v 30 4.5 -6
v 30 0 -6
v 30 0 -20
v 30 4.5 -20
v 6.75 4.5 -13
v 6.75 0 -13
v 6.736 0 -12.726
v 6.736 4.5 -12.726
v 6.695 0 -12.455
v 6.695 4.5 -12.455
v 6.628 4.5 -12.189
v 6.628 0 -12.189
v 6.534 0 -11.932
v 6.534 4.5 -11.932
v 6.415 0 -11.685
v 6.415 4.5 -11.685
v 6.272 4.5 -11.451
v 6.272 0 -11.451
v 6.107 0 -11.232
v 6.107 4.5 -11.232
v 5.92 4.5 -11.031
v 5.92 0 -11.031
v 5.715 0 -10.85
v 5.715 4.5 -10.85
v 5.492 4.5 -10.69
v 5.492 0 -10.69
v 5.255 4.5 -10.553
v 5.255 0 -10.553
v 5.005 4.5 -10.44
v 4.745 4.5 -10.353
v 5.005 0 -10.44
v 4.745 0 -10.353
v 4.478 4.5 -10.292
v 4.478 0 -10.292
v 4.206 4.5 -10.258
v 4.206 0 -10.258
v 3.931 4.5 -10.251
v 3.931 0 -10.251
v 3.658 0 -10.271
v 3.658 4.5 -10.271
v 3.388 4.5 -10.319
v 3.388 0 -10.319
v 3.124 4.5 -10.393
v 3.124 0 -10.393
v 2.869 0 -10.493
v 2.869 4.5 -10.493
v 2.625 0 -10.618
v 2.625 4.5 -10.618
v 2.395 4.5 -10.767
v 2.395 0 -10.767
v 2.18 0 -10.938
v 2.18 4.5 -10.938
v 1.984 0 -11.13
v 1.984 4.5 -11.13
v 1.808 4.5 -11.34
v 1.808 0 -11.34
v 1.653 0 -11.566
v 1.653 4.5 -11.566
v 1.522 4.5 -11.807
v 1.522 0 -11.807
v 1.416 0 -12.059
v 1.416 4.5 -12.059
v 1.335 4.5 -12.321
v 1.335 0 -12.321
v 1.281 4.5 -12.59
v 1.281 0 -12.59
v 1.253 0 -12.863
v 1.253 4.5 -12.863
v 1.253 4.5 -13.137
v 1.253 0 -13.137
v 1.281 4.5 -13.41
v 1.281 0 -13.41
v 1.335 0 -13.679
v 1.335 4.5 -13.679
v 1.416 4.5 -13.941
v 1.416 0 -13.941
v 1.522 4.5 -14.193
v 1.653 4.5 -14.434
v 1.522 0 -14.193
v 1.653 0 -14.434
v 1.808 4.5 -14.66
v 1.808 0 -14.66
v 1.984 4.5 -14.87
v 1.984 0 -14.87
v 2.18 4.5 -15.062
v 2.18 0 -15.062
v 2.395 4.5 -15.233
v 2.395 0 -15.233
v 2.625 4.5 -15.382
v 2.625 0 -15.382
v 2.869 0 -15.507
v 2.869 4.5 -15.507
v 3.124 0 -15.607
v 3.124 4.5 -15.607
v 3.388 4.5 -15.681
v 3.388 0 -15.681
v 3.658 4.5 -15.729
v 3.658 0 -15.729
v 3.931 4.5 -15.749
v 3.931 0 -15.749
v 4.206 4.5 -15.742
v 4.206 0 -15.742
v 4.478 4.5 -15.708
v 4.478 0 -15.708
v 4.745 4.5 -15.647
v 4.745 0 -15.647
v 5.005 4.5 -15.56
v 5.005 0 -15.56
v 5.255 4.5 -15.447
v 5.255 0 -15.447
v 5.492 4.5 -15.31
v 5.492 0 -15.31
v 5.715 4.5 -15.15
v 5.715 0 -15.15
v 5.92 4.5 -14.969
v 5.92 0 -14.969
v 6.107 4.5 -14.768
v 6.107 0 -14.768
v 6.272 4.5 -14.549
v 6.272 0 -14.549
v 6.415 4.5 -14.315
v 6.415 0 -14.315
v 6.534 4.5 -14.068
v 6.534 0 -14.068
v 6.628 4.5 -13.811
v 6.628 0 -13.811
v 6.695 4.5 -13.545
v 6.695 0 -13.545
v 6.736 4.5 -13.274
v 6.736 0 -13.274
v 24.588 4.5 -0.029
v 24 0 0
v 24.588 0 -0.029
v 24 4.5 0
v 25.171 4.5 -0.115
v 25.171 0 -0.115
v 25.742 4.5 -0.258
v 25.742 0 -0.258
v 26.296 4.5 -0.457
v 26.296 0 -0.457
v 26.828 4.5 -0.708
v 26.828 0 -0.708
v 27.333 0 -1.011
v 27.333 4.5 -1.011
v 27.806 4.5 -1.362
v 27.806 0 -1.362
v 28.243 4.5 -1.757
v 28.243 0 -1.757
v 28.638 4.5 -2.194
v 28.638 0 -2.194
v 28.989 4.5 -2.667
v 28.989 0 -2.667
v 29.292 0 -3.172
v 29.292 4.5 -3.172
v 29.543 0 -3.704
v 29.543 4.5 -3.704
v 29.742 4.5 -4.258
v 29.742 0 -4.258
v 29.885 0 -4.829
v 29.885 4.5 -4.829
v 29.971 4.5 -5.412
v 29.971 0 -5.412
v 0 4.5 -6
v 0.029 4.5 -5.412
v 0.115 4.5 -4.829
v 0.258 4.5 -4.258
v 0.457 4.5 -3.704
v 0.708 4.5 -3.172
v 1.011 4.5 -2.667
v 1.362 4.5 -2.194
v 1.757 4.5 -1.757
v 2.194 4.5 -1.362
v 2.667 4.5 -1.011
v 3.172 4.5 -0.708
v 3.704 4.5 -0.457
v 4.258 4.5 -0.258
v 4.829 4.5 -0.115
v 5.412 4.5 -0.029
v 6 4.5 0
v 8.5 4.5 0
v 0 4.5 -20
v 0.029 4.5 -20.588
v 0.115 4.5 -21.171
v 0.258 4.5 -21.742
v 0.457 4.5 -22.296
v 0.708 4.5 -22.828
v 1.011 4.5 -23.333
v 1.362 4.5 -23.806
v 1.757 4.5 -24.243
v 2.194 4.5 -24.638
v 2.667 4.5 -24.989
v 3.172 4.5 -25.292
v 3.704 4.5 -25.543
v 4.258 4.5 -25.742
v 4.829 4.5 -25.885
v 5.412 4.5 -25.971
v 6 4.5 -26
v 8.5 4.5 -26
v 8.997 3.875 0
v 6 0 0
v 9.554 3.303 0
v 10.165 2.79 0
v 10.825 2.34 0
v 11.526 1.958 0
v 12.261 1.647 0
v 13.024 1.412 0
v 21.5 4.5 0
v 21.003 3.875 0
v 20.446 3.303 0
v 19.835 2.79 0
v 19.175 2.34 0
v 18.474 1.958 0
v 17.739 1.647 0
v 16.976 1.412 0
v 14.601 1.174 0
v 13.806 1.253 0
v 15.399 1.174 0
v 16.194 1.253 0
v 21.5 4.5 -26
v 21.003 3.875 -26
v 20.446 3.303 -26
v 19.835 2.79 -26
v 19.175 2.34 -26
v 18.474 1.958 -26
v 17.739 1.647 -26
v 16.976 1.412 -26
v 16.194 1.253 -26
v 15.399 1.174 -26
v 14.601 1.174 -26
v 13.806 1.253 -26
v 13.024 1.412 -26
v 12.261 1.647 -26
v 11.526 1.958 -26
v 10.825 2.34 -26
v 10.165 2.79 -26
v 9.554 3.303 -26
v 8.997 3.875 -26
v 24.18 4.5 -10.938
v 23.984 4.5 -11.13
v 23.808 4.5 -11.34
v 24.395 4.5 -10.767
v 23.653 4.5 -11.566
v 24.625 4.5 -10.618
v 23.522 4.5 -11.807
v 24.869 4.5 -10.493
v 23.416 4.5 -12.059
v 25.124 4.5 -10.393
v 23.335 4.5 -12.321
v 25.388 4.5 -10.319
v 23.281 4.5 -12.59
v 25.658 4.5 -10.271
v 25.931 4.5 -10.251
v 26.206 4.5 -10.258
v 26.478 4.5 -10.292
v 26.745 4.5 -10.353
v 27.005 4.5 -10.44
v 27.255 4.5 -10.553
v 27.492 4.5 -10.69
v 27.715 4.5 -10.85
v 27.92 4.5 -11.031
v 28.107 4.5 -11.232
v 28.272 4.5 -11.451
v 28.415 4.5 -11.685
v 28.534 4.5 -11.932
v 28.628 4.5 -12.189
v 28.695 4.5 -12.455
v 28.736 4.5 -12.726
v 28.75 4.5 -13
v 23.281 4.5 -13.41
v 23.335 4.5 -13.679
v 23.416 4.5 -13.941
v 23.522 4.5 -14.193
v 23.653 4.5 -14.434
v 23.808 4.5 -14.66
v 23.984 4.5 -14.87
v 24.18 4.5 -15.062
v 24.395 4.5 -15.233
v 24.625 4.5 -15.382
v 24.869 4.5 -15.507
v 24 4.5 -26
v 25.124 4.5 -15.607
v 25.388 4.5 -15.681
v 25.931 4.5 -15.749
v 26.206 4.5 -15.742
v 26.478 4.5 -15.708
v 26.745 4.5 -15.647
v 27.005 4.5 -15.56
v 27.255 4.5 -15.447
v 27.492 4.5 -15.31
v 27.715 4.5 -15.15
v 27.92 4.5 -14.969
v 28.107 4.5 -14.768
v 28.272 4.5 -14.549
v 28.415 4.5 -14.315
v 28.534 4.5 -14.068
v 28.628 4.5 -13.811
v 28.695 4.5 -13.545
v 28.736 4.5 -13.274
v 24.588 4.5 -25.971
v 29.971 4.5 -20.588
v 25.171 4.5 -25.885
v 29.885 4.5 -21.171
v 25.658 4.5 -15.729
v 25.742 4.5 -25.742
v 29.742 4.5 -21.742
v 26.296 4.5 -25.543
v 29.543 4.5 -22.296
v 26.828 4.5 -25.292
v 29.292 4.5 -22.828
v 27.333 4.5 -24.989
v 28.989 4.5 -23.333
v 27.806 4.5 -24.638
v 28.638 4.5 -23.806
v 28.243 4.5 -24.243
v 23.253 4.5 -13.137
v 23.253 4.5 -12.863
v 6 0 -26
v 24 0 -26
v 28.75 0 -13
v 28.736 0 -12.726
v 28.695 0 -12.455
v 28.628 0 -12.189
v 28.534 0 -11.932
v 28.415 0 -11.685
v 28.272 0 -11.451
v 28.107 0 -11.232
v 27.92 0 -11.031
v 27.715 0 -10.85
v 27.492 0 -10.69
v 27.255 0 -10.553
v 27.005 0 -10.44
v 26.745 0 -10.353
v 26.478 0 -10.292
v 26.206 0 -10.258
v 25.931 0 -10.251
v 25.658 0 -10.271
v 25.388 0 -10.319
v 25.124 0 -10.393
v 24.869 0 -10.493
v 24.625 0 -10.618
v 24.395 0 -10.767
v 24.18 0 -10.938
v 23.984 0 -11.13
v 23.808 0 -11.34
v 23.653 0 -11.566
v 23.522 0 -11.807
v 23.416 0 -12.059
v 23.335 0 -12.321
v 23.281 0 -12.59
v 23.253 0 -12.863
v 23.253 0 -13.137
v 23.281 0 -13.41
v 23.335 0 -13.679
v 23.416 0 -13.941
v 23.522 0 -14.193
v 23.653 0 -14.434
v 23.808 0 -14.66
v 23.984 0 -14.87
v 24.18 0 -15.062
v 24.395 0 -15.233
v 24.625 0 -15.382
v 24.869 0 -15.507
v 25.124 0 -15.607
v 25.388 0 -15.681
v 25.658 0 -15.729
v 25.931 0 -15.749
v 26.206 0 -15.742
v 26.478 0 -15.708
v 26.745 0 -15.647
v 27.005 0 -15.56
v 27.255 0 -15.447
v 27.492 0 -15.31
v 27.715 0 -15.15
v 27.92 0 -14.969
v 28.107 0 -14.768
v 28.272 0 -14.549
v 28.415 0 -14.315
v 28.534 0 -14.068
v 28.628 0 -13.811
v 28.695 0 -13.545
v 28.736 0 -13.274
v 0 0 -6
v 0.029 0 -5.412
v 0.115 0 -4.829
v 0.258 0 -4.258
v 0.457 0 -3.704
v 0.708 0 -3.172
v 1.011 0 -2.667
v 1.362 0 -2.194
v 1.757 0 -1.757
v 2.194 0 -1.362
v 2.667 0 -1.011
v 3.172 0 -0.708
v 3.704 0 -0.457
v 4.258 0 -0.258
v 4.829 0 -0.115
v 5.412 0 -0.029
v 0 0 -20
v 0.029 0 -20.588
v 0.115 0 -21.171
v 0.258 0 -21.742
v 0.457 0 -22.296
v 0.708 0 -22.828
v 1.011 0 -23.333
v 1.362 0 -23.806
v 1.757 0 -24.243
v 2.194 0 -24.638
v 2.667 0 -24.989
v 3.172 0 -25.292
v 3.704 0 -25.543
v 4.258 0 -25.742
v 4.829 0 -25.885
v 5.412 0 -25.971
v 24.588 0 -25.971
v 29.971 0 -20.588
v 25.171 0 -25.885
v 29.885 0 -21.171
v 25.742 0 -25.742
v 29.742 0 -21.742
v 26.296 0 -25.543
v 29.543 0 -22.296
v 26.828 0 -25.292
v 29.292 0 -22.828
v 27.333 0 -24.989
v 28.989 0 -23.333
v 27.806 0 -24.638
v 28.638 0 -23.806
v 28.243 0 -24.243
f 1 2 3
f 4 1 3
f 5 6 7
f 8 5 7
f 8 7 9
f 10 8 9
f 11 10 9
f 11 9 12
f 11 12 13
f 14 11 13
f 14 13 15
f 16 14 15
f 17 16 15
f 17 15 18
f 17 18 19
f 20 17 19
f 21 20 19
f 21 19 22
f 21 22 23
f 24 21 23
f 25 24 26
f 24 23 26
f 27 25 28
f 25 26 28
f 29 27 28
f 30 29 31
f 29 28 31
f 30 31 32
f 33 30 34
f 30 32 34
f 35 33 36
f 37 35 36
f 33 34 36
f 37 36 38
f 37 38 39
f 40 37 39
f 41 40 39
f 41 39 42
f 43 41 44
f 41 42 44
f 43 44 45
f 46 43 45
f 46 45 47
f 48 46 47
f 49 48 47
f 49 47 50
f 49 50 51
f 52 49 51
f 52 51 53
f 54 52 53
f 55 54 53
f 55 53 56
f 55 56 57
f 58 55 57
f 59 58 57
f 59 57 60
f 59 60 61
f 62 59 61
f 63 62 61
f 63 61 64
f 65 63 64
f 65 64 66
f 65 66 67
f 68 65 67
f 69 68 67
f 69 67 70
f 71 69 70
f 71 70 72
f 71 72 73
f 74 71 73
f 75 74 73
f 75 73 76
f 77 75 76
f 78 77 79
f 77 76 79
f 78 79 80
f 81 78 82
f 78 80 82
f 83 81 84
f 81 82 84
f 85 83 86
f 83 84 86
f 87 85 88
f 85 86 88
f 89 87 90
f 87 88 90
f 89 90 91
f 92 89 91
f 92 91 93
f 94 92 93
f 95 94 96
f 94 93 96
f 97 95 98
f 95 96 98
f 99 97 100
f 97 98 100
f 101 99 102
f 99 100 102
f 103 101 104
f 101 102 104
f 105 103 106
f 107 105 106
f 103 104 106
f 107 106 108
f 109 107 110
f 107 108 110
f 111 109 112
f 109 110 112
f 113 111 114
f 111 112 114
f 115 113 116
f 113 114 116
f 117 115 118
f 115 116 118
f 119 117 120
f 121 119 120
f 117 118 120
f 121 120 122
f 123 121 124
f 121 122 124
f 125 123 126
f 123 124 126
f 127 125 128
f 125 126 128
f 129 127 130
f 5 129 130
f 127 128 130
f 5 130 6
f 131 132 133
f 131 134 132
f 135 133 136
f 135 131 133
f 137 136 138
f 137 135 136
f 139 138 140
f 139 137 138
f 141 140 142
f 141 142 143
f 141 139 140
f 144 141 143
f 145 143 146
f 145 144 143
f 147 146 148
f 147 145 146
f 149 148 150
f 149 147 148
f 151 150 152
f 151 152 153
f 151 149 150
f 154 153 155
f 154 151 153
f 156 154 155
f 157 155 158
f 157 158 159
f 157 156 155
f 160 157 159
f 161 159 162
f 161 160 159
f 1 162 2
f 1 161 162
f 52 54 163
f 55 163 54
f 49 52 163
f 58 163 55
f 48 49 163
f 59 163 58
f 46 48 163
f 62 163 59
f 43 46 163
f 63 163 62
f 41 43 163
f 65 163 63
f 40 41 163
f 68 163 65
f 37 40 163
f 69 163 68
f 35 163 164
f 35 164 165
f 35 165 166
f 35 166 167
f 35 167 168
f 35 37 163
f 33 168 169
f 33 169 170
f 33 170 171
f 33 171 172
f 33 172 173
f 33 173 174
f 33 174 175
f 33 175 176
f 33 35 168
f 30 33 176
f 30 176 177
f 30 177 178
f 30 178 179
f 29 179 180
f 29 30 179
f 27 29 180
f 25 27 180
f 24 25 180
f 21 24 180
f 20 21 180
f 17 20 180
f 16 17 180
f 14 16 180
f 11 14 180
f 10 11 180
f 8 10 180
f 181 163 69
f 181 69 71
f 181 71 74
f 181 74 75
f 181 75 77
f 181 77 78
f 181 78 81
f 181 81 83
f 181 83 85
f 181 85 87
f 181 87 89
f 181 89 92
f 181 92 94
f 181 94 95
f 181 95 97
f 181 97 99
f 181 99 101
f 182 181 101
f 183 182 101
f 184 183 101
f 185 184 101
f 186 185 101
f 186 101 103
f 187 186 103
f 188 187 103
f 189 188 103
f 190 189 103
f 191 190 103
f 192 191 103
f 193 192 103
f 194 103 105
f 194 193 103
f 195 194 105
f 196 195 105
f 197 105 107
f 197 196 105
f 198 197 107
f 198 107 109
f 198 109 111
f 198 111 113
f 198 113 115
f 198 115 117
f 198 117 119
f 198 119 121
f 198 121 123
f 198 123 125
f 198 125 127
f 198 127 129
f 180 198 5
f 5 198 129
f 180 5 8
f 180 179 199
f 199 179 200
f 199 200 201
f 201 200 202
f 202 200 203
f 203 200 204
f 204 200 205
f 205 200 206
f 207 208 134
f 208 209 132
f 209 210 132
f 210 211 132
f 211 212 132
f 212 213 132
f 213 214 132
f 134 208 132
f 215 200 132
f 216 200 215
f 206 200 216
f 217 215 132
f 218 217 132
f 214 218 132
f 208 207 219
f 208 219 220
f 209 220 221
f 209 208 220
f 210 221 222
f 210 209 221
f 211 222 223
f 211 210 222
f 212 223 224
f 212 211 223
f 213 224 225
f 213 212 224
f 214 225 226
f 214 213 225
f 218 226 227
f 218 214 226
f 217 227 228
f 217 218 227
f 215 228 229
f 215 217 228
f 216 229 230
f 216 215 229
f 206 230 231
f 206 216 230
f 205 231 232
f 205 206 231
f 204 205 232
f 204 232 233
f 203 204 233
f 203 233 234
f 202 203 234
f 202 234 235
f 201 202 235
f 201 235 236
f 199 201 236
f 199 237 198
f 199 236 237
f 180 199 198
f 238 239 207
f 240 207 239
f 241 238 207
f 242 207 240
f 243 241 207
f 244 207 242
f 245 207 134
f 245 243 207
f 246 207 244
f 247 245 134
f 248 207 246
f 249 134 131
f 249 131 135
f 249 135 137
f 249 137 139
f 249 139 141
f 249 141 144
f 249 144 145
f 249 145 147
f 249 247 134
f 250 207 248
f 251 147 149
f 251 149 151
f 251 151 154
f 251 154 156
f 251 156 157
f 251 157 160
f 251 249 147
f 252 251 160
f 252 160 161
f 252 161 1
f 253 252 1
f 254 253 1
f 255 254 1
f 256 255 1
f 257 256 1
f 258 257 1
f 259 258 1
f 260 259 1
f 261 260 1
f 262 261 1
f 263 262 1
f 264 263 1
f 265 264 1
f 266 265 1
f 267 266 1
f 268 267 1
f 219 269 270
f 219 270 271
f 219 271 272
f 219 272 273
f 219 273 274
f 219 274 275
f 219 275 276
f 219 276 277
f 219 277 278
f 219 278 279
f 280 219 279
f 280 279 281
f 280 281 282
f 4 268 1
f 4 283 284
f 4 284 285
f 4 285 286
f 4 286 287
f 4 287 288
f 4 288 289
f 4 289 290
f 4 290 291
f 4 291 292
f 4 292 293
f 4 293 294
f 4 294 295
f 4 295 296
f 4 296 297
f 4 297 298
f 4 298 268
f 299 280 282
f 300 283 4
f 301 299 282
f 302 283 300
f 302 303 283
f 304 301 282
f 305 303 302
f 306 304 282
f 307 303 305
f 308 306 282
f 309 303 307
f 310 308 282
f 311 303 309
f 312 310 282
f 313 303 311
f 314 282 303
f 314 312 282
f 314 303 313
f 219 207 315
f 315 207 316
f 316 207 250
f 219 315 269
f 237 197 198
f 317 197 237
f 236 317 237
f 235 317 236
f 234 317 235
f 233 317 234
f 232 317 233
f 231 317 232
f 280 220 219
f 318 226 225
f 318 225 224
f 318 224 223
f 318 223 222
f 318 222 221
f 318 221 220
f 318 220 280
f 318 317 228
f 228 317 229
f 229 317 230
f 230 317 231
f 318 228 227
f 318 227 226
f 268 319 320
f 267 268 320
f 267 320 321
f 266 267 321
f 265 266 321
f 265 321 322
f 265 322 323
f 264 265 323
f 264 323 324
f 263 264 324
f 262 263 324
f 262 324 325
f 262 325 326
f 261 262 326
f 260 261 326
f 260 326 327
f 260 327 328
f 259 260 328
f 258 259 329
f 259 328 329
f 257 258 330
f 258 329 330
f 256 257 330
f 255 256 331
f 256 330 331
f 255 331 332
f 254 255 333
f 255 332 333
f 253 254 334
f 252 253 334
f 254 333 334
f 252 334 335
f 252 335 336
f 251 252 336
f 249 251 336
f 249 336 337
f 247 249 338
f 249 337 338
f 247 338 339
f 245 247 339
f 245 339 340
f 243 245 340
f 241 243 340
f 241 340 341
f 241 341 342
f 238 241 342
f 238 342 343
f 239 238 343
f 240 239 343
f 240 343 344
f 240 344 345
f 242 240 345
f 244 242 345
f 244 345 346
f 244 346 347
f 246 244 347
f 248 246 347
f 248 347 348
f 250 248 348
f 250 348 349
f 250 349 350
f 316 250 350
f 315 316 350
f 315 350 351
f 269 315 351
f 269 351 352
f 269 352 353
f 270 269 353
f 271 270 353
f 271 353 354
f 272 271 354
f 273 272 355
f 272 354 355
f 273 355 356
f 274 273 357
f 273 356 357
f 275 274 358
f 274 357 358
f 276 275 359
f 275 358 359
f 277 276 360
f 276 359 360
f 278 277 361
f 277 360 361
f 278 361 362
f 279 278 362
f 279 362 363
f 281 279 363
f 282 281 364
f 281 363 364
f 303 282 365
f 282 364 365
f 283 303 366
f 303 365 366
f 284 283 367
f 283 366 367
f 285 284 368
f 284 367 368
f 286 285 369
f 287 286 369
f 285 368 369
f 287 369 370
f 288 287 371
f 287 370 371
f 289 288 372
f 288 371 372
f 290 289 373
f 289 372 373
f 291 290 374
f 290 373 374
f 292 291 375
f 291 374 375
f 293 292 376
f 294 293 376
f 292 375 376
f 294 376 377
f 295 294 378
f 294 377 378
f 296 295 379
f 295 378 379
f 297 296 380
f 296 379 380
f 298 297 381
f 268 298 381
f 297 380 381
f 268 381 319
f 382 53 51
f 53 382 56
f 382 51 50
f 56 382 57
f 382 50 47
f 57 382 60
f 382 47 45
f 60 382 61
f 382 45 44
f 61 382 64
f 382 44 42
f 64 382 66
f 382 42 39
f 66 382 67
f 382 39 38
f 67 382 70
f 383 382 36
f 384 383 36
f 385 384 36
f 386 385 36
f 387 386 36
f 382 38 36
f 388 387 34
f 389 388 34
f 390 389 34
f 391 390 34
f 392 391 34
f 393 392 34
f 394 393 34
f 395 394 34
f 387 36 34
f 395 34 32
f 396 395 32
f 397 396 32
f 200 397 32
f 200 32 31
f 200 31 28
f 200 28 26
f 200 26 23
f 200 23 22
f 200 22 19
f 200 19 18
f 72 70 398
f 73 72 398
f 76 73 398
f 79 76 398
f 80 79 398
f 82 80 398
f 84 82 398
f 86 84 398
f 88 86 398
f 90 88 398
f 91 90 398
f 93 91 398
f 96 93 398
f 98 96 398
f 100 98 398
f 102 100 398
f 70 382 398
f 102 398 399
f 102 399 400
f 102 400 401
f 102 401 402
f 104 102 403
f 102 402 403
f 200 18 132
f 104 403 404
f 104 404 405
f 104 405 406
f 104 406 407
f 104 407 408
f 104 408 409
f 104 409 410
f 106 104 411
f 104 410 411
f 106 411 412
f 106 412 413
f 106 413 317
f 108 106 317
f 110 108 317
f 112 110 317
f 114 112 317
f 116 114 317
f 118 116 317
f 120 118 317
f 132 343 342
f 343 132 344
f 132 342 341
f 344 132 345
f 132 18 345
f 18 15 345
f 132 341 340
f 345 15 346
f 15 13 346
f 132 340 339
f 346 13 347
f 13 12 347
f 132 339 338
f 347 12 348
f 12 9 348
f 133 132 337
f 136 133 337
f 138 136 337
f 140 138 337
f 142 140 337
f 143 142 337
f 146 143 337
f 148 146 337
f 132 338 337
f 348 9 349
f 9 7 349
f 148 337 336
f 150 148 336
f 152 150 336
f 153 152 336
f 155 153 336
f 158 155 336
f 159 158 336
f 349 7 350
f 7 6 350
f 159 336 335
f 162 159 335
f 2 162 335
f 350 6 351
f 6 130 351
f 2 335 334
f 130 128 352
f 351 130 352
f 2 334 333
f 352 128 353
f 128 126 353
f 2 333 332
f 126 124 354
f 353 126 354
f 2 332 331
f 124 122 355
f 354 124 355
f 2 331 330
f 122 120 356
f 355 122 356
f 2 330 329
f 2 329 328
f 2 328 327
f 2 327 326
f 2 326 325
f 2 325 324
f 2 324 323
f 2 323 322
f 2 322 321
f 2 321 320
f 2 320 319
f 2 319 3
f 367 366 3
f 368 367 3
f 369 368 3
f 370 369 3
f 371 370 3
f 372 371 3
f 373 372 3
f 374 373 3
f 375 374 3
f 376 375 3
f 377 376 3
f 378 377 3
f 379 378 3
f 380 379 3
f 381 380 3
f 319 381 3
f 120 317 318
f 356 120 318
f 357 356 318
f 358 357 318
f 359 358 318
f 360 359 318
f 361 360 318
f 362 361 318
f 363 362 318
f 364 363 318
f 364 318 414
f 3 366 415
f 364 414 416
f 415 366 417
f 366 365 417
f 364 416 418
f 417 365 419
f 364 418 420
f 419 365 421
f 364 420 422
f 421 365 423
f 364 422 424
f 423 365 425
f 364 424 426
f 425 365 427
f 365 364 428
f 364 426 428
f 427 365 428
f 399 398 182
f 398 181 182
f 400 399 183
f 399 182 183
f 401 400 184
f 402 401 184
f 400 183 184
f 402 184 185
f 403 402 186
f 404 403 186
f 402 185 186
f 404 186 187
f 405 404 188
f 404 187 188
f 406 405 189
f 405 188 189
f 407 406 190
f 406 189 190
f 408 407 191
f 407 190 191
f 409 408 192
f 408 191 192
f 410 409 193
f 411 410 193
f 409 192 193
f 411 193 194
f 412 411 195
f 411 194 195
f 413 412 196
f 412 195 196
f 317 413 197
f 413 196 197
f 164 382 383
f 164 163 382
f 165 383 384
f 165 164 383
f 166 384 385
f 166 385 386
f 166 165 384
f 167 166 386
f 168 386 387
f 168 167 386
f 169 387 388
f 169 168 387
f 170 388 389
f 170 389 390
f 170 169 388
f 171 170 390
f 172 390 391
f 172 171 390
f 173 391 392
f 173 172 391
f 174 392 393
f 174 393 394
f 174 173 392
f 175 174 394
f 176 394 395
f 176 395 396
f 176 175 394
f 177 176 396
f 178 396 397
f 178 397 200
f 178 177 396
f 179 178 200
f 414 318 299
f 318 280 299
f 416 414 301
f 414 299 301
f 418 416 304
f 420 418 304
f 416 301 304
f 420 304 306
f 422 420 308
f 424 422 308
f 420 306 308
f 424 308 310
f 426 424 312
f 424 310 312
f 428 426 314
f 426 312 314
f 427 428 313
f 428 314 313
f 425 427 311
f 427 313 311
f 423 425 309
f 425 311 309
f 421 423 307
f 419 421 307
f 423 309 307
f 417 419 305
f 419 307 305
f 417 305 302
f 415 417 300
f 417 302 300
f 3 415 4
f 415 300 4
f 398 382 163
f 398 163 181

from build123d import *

# Parameters (mm, degrees)
SKETCH1_W                      = 30
SKETCH1_H                      = 26
BOSS_EXTRUDE1_DEPTH            = 4.5
CUT_EXTRUDE1_DEPTH             = 40.953097502
F_5_5_5_5_DIAMETER_HOLE1_D     = 5.5
F_5_5_5_5_DIAMETER_HOLE1_DEPTH = 10
F_5_5_5_5_DIAMETER_HOLE1_TIP   = 1.652366702
FILLET2_R                      = 6


with BuildPart() as part:
    # Sketch1 → Boss-Extrude1 (new body)
    with BuildSketch(Plane(origin=(0, 0, 0), x_dir=(1, 0, 0), z_dir=(0, 1, 0))):
        with Locations((15, 13)):
            Rectangle(SKETCH1_W, SKETCH1_H)
    extrude(amount=BOSS_EXTRUDE1_DEPTH)

    # Sketch2 → Cut-Extrude1 (cut, through all)
    with BuildSketch(Plane.XY):
        with BuildLine():
            Line((8.5, 4.5), (21.5, 4.5))
            ThreePointArc((21.5, 4.5), (15, 1.163689527), (8.5, 4.5))
        make_face()
    extrude(amount=-CUT_EXTRUDE1_DEPTH, mode=Mode.SUBTRACT)

    # Ø5.5 (5.5) Diameter Hole1
    with Locations(Plane(origin=(0, 4.5, 0), x_dir=(-1, 0, 0), z_dir=(0, 1, 0))):
        with Locations((-4, -13), (-26, -13)):
            Hole(F_5_5_5_5_DIAMETER_HOLE1_D / 2, depth=F_5_5_5_5_DIAMETER_HOLE1_DEPTH)
            with Locations((0, 0, -(F_5_5_5_5_DIAMETER_HOLE1_DEPTH + F_5_5_5_5_DIAMETER_HOLE1_TIP / 2))):  # 118° drill point
                Cone(0, F_5_5_5_5_DIAMETER_HOLE1_D / 2, F_5_5_5_5_DIAMETER_HOLE1_TIP, mode=Mode.SUBTRACT)

    # Fillet2
    fillet2_edges = [part.edges().sort_by_distance(p)[0] for p in [
        (0, 2.25, 0),
        (0, 2.25, -26),
        (30, 2.25, -26),
        (30, 2.25, 0),
    ]]
    fillet(fillet2_edges, radius=FILLET2_R)


solid = part.part
